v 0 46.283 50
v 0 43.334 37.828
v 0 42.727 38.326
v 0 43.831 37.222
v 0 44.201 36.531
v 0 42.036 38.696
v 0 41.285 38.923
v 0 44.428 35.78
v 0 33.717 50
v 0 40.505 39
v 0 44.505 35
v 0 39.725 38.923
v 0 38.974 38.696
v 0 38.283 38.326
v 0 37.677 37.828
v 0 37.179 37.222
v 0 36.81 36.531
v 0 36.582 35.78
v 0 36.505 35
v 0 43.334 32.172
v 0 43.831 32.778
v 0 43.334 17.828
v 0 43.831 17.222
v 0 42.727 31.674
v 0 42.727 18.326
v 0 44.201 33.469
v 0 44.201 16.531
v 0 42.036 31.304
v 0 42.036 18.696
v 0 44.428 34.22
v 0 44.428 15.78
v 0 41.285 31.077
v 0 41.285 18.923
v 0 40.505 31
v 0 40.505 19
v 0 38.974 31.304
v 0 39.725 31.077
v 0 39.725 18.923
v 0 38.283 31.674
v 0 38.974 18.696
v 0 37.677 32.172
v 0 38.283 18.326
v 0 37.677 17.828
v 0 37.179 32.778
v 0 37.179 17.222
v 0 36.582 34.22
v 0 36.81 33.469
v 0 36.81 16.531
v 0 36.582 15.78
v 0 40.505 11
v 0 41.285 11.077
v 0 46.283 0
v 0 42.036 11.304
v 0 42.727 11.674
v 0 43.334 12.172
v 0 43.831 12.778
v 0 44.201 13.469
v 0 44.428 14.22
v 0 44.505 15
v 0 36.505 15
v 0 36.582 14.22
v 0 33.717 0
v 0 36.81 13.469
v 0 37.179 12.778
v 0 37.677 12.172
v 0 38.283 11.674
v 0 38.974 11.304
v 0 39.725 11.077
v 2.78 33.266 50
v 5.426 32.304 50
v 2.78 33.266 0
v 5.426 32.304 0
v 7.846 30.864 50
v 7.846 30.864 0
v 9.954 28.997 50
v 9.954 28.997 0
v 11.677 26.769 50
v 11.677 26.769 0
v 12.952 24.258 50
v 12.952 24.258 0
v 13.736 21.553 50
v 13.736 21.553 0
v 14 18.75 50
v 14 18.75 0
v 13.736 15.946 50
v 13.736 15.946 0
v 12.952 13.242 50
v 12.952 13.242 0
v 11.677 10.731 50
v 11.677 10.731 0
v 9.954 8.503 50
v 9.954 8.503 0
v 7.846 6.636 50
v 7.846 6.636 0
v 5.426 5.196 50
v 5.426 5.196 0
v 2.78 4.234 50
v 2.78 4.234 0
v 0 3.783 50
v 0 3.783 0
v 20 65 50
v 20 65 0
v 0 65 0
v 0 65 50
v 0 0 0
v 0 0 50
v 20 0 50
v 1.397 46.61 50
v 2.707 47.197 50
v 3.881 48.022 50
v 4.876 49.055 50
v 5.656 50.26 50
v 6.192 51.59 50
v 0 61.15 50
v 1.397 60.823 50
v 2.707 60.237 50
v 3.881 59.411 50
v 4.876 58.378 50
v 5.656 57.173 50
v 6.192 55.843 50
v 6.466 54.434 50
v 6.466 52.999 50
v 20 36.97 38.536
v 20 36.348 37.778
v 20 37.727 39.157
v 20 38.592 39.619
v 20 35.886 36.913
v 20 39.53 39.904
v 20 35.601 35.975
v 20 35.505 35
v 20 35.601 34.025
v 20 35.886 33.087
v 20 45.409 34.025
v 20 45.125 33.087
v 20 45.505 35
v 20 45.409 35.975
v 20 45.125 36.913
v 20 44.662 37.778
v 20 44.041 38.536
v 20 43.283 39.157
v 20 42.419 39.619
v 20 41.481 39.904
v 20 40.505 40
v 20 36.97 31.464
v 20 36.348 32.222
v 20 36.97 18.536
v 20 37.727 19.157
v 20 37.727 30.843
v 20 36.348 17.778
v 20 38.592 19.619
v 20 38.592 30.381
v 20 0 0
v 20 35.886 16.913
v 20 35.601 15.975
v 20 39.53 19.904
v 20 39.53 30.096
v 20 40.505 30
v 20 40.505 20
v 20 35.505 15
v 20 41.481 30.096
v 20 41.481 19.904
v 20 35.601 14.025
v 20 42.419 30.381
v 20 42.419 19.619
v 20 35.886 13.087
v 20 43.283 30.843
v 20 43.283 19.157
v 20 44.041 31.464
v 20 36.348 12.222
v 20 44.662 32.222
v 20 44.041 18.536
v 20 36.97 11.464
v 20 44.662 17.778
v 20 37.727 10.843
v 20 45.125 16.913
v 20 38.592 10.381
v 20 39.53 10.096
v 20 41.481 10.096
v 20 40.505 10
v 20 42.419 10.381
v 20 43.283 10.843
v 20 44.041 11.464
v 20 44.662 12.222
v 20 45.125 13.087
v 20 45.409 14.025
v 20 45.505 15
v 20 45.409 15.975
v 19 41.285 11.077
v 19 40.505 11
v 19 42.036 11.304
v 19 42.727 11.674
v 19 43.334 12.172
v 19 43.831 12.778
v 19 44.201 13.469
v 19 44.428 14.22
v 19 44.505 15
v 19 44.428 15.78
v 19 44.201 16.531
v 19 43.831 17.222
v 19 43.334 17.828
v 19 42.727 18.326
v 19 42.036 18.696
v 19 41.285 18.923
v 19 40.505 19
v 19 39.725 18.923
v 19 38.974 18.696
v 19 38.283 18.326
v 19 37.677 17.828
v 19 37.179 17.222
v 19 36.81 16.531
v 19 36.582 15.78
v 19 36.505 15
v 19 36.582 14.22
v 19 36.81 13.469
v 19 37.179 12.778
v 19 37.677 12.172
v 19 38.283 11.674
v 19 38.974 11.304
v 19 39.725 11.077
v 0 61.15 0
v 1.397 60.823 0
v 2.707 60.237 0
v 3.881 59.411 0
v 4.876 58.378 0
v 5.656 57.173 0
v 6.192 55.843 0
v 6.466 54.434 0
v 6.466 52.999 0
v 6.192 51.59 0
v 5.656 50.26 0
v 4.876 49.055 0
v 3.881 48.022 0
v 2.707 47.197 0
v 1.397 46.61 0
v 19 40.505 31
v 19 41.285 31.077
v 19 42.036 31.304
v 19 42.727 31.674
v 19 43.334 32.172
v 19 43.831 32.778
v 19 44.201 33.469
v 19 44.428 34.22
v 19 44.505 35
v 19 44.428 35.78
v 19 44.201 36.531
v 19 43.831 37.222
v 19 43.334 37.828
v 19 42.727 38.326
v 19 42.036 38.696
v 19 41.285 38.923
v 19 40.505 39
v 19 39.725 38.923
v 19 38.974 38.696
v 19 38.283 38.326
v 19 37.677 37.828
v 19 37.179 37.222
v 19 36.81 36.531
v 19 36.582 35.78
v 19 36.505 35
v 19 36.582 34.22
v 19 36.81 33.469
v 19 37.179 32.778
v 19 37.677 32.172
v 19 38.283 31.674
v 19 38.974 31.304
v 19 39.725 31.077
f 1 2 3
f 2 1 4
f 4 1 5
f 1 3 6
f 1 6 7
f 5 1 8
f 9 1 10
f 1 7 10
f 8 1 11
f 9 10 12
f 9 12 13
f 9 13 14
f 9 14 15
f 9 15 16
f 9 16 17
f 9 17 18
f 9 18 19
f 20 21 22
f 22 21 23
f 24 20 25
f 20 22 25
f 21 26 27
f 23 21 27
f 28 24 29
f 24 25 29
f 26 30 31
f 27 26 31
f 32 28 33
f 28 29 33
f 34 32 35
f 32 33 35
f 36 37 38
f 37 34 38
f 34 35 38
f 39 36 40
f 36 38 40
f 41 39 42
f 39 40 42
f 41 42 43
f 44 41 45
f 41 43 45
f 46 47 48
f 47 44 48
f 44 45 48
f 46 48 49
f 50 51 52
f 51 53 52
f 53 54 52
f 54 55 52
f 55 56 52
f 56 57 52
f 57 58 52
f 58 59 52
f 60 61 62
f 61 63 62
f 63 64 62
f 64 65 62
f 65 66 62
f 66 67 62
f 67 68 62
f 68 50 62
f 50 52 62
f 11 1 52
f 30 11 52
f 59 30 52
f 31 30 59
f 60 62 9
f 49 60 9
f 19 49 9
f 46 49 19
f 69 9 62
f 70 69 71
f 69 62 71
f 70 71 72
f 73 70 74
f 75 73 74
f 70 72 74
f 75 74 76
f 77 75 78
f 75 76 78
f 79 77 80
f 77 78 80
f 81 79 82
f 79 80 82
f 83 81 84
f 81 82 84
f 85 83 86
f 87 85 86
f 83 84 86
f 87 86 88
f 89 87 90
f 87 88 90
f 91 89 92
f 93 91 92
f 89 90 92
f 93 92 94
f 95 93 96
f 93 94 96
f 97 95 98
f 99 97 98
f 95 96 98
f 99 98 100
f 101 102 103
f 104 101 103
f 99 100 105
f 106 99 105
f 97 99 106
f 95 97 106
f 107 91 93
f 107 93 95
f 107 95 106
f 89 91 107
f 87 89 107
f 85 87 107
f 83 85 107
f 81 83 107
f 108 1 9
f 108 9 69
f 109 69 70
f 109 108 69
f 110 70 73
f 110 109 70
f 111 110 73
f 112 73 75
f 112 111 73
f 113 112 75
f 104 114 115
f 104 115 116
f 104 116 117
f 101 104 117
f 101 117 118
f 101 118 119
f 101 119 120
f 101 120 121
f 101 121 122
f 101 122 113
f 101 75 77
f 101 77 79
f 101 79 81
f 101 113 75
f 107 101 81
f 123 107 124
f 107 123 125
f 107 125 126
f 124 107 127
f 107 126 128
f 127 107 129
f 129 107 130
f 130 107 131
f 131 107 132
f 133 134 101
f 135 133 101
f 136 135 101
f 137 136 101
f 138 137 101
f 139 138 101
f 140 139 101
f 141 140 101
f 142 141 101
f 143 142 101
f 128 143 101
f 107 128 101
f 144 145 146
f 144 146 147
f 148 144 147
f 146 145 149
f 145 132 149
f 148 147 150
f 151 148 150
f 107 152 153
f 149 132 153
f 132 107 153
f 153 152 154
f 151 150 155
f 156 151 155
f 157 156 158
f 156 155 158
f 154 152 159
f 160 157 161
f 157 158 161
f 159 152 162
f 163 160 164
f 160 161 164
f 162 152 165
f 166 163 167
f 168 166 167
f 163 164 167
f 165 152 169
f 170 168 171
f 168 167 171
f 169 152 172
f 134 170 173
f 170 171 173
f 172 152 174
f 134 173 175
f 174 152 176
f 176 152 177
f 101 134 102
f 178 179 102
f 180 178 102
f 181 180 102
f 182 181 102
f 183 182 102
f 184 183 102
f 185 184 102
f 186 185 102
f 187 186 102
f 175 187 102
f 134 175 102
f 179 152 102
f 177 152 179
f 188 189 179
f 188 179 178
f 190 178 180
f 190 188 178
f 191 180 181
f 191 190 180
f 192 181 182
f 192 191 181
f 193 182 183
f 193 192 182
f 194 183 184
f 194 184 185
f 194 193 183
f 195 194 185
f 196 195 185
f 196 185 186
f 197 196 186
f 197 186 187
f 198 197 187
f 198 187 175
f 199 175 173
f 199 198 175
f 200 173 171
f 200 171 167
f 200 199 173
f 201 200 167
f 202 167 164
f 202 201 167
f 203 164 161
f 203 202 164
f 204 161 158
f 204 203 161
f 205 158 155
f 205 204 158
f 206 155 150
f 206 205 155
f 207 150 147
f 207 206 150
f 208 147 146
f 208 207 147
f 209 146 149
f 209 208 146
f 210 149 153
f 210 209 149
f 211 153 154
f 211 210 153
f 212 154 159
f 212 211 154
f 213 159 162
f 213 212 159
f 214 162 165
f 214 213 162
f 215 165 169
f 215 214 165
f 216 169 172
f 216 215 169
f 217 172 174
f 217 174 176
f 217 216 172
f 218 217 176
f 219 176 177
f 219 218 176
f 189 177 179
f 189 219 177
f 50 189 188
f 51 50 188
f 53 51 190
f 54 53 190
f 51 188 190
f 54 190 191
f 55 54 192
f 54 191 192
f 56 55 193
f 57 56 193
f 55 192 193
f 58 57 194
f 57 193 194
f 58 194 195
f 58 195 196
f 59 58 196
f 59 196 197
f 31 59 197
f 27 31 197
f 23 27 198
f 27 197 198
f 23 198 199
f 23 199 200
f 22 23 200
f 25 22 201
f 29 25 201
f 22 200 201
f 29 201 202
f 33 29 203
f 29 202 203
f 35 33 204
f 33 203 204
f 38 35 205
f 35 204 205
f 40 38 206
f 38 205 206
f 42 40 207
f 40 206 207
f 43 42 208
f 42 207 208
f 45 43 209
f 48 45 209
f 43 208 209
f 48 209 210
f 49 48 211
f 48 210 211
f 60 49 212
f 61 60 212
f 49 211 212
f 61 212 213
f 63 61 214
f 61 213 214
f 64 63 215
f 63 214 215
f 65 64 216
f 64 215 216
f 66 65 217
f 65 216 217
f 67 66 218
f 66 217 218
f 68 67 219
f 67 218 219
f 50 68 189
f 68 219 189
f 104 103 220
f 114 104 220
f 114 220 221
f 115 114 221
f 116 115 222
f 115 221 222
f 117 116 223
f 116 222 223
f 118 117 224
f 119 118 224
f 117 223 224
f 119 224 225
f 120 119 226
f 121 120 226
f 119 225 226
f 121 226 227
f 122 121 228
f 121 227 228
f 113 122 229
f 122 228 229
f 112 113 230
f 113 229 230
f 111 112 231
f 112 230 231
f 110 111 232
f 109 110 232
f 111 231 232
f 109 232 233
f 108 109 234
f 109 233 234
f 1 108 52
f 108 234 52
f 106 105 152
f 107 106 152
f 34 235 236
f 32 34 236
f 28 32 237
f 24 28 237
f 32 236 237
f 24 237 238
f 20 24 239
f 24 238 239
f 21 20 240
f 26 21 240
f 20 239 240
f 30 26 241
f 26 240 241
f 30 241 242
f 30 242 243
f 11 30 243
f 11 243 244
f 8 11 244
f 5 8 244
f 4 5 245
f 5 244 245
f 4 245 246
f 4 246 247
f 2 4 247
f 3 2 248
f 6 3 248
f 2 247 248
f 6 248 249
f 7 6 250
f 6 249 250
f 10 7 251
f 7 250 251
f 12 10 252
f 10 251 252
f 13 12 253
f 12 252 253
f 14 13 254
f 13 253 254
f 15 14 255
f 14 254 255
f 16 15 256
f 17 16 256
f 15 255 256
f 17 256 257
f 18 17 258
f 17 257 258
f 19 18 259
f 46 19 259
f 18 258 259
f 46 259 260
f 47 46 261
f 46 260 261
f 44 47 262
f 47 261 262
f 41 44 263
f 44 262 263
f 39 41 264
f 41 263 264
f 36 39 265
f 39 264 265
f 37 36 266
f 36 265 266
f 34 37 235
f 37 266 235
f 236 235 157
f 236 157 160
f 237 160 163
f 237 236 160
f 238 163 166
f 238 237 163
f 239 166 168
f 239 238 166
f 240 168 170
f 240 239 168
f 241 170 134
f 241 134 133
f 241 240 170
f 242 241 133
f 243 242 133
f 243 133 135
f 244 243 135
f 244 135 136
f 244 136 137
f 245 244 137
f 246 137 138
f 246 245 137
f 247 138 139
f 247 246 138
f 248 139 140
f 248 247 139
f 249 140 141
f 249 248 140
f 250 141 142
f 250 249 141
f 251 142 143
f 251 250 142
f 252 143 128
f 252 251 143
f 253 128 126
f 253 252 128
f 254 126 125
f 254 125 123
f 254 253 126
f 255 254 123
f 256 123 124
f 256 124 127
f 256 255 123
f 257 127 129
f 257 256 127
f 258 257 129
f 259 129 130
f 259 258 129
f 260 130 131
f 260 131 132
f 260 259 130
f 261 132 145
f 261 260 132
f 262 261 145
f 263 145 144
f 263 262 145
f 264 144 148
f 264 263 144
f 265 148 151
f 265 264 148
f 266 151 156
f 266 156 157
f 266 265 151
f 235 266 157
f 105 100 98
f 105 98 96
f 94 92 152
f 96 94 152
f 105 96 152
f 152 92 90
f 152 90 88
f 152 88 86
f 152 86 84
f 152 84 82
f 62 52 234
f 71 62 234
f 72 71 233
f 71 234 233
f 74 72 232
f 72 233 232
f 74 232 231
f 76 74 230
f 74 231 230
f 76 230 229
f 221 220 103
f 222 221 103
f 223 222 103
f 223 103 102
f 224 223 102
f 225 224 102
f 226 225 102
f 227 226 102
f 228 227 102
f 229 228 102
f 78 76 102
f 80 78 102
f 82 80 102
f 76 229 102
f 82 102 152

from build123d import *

# Parameters (mm, degrees)
BOSS_EXTRUDE1_DEPTH = 50
SKETCH2_R           = 4
CUT_EXTRUDE1_DEPTH  = 20
CHAMFER1_SIZE       = 1


with BuildPart() as part:
    # Sketch1 → Boss-Extrude1 (new body)
    with BuildSketch(Plane.XY):
        with BuildLine():
            Line((0, 0), (20, 0))
            Line((20, 0), (20, 65))
            Line((20, 65), (0, 65))
            Line((0, 65), (0, 61.14955156))
            ThreePointArc((0, 61.14955156), (6.5, 53.716517187), (0, 46.283482813))
            Line((0, 46.283482813), (0, 33.716517187))
            ThreePointArc((0, 33.716517187), (14, 18.74988764), (0, 3.783258093))
            Line((0, 3.783258093), (0, 0))
        make_face()
    extrude(amount=BOSS_EXTRUDE1_DEPTH)

    # Sketch2 → Cut-Extrude1 (cut)
    with BuildSketch(Plane(origin=(20, 0, 0), x_dir=(0, 0, -1), z_dir=(1, 0, 0))):
        with Locations((-35, 40.505102572)):
            Circle(SKETCH2_R)
        with Locations((-15, 40.505102572)):
            Circle(SKETCH2_R)
    extrude(amount=-CUT_EXTRUDE1_DEPTH, mode=Mode.SUBTRACT)

    # Chamfer1
    chamfer1_edges = [part.edges().sort_by_distance(p)[0] for p in [
        (20, 40.505102572, 39),
        (20, 40.505102572, 19),
    ]]
    chamfer(chamfer1_edges, length=CHAMFER1_SIZE)


solid = part.part
